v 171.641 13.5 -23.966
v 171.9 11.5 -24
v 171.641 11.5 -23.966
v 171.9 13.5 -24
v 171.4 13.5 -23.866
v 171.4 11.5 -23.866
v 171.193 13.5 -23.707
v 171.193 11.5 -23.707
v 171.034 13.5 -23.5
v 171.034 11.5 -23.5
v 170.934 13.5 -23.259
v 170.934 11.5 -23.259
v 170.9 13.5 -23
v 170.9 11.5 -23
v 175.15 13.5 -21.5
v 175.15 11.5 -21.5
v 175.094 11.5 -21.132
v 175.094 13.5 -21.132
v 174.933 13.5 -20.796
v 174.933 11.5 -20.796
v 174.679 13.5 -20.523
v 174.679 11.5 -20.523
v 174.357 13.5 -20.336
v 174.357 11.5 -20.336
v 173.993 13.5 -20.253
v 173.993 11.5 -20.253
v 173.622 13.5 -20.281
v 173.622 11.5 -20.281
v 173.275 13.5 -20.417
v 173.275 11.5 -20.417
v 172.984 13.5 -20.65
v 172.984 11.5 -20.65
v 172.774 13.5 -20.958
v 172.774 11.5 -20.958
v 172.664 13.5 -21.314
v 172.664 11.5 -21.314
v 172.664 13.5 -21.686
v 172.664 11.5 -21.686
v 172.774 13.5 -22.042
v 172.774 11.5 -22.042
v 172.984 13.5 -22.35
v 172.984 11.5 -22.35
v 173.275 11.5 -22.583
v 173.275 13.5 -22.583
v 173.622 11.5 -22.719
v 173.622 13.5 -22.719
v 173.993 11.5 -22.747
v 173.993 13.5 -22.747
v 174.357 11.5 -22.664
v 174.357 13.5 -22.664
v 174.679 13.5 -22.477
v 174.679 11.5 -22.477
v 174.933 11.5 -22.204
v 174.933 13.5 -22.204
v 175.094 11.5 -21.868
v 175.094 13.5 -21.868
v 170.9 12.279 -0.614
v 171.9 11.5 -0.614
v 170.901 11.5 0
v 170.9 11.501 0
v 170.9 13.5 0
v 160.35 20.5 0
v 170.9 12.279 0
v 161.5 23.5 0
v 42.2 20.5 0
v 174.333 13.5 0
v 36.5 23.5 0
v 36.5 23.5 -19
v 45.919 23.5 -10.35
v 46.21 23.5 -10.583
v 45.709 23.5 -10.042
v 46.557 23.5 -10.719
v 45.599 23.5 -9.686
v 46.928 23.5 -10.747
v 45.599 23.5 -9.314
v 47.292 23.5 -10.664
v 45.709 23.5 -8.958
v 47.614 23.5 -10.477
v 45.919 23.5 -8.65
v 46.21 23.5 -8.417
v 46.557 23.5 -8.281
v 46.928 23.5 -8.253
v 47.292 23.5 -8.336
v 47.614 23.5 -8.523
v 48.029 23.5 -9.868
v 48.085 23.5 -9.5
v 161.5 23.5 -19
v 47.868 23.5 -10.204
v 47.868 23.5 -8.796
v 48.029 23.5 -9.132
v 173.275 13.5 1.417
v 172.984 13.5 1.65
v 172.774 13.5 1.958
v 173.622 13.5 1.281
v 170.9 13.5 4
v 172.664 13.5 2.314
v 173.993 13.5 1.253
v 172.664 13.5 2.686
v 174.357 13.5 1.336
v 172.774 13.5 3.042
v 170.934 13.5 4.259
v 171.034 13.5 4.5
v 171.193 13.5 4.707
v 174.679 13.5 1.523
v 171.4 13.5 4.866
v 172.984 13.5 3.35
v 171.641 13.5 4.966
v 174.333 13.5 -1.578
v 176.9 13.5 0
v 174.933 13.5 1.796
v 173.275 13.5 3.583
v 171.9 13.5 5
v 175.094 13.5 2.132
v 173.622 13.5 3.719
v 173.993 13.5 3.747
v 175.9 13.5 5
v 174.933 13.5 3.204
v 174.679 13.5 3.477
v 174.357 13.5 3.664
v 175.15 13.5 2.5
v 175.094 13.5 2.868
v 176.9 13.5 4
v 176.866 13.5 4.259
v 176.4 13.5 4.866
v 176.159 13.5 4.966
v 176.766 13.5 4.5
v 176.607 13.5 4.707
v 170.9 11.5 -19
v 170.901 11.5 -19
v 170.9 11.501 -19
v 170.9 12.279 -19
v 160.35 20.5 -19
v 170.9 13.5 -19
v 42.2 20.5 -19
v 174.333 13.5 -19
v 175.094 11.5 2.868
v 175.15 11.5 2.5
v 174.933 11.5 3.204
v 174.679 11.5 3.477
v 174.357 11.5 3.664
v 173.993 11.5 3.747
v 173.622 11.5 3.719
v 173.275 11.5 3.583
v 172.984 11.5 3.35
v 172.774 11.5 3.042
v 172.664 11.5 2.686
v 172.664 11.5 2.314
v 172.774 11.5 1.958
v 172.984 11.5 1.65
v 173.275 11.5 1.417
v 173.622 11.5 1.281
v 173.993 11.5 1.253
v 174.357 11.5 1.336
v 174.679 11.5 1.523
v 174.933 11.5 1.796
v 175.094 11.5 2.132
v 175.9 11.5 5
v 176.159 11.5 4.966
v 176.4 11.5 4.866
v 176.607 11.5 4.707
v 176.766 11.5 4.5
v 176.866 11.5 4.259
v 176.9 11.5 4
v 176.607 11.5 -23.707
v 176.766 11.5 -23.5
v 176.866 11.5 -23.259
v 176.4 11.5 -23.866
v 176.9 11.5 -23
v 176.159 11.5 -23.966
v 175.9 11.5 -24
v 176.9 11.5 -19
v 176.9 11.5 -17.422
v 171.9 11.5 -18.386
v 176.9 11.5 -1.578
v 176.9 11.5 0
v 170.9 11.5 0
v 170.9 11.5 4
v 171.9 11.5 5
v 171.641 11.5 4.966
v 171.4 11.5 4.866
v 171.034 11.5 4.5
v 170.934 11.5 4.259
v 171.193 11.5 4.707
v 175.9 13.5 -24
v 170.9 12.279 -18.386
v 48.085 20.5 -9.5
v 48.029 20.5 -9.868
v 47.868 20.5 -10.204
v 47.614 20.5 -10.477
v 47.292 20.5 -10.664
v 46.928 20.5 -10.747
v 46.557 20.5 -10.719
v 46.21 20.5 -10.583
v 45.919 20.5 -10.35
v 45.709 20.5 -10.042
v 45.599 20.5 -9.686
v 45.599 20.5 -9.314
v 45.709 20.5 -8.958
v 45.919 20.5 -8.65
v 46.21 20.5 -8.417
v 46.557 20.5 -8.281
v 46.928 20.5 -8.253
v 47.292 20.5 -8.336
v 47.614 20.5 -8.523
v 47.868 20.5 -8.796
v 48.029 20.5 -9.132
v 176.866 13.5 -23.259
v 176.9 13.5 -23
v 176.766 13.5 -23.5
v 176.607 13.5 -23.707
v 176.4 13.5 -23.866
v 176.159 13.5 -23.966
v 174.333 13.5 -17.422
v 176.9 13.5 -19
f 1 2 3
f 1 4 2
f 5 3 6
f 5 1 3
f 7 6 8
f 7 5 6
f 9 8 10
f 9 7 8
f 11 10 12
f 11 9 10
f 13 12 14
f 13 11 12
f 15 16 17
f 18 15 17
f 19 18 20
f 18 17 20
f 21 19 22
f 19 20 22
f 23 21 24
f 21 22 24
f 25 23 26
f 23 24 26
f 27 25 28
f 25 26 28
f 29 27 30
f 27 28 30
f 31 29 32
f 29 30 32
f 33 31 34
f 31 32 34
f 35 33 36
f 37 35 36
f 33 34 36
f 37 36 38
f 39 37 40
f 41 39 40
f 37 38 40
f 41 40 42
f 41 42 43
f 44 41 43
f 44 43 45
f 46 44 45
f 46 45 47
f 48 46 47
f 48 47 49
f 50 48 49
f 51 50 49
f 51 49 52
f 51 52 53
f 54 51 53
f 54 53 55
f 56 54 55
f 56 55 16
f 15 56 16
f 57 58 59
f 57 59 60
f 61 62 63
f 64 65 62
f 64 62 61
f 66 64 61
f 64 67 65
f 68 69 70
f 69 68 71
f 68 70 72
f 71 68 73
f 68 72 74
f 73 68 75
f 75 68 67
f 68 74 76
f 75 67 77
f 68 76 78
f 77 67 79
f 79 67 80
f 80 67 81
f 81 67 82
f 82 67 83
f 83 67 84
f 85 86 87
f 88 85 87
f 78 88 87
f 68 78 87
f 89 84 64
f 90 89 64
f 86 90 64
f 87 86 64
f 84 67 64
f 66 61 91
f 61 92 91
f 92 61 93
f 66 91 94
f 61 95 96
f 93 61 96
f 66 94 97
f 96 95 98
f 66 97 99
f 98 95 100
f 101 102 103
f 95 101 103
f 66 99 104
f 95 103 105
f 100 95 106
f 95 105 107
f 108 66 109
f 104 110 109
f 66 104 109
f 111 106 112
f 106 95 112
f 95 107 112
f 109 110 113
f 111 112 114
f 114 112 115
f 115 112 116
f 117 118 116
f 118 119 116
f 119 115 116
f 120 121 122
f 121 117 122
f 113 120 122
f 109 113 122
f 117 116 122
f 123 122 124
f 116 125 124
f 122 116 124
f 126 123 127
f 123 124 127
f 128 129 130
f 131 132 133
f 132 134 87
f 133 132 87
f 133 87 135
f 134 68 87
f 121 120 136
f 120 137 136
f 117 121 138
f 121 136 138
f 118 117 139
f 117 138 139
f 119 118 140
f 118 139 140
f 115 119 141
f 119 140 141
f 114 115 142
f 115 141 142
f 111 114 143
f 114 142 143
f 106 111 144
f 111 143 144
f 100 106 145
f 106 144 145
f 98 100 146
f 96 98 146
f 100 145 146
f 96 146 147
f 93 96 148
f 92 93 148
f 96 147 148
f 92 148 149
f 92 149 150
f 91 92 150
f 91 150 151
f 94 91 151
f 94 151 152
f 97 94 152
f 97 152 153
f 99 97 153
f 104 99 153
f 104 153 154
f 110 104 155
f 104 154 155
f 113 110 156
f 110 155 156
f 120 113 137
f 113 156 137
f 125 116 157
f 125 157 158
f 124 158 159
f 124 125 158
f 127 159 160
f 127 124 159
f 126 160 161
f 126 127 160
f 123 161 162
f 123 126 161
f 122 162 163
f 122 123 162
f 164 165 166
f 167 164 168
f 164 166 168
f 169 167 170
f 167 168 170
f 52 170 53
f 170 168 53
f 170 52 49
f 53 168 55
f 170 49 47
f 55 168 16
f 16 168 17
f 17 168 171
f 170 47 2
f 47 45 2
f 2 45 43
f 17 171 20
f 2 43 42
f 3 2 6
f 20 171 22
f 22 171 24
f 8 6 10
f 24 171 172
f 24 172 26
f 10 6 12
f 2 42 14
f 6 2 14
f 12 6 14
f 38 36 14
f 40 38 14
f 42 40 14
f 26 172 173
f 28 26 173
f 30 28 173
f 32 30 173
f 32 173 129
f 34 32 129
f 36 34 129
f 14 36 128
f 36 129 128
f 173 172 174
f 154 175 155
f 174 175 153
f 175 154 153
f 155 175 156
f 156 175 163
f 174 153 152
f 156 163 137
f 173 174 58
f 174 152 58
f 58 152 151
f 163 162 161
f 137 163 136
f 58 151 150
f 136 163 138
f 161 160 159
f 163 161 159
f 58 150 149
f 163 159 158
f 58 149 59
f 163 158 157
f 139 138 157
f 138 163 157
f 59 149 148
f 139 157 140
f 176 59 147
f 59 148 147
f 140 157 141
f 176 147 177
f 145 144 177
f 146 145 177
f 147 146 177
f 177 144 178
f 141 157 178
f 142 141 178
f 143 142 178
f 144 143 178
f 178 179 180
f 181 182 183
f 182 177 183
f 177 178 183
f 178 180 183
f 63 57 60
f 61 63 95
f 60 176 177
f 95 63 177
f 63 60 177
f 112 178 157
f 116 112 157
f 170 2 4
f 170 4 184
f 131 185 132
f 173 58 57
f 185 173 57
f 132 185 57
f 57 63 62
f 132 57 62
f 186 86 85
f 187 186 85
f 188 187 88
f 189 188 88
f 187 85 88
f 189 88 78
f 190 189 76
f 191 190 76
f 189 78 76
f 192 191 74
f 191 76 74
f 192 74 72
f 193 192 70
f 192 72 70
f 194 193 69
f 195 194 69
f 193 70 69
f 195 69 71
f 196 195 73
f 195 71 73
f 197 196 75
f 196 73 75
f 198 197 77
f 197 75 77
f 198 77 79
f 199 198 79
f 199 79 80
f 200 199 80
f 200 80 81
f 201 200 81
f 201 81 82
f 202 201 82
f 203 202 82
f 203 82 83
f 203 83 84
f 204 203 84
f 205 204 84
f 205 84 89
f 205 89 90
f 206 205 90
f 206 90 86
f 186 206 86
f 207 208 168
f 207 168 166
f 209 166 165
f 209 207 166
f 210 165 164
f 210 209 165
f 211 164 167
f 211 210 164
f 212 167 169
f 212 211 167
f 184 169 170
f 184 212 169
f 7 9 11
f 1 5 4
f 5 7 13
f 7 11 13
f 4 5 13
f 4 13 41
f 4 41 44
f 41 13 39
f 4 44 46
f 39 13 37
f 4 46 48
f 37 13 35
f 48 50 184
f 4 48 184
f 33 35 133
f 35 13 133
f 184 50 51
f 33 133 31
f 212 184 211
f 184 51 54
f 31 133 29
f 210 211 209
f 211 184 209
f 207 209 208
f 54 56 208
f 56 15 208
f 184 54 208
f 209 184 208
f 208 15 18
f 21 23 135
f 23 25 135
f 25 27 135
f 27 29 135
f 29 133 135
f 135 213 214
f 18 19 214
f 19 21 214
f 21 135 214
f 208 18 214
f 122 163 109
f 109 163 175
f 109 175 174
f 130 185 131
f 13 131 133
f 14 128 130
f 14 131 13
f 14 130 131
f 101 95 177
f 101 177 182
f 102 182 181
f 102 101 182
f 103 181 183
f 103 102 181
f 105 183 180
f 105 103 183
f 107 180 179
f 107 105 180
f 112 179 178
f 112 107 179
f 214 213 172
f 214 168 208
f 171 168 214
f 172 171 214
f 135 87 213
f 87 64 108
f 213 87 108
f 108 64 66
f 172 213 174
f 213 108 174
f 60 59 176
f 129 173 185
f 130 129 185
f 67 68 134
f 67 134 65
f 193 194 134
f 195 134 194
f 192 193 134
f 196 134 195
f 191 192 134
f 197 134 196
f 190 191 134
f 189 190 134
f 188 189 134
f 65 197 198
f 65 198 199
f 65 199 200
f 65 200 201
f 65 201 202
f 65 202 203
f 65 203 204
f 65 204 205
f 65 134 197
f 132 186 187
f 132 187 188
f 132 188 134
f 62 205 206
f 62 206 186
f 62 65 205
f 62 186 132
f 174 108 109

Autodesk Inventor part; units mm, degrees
ref_plane "YZ Plane" through (0, 0, 0) normal (1, 0, 0) x (0, 1, 0)
ref_plane "XZ Plane" through (0, 0, 0) normal (0, 1, 0) x (-1, 0, 0)
ref_plane "XY Plane" through (0, 0, 0) normal (0, 0, 1) x (1, 0, 0)
sketch "Эскиз1" plane through (0, 0, 0) normal (0, 0, 1) x (1, 0, 0)
  line L0 (176.9, 11.5) -> (160.5, 11.5) projected
  line L1 (19.5, 13.5) -> (19.5, 3.5) projected
  line L2 (19.5, 3.5) -> (127.2, 3.5) projected
  line L3 (127.2, 3.5) -> (127.2, -1.5) projected
  line L4 (127.2, -1.5) -> (2.5, -1.5) projected
  line L5 (2.5, -1.5) -> (2.5, 18.5) projected
  line L6 (2.5, 18.5) -> (36.5, 18.5) projected
  line L7 (36.5, 18.5) -> (36.5, 13.5) projected
  line L8 (36.5, 13.5) -> (19.5, 13.5) projected
  line L9 (131.9067, -6.5) -> (131.9067, 11.5) projected
  line L10 (131.9067, 11.5) -> (59.18, 11.5) projected
  line L11 (59.18, 11.5) -> (51.5, 15.5635) projected
  line L12 (36.5, 23.5) -> (-2.5, 23.5) projected
  line L13 (-2.5, 23.5) -> (-2.5, 12.5) projected
  line L14 (-2.5, 12.5) -> (0.5, 12.5) projected
  line L15 (0.5, 12.5) -> (0.5, 9.5) projected
  line L16 (0.5, 9.5) -> (-2.5, 9.5) projected
  line L17 (-2.5, 9.5) -> (-2.5, -3.5) projected
  line L18 (5.5, -6.5) -> (131.9067, -6.5) projected
  circle A0 centre (129.7, 9) radius 1.25 projected
  line L19 (36.5, 23.5) -> (161.5, 23.5)
  line L20 (161.5, 23.5) -> (176.9, 11.5)
  line L21 (176.9, 11.5) -> (171.9, 11.5)
  line L22 (171.9, 11.5) -> (160.35, 20.5)
  line L23 (36.5, 23.5) -> (36.5, 20.5)
  line L24 (36.5, 20.5) -> (160.35, 20.5)
  line L25 (42.17, 20.5) -> (36.5, 23.5) projected
  line L26 (51.5, 20.5) -> (51.5, 15.5635) projected
  line L27 (42.17, 20.5) -> (51.5, 20.5) projected
  line L28 (5.5, -6.5) -> (5.5, -3.5) projected
  line L29 (-2.5, -3.5) -> (5.5, -3.5) projected
  point P0 (0, 0)
  point P1 (42.17, 20.5)
  dimension "d0" = 125
  dimension "d1" = 5
  dimension "d2" = 3
extrude "Выдавливание1" add sketch "Эскиз1" against normal blind 19 contours L0 L22 L24 L25 L19 L20 | L25 L24 L23
sketch "Эскиз2" plane through (36.5, 23.5, 0) normal (0, 1, 0) x (1, 0, 0)
  line L0 (125, 0) -> (0, 0) projected
  line L1 (0, 19) -> (125, 19) projected
  line L2 (0, 0) -> (10.335, 0) construction
  line L3 (10.335, 0) -> (10.335, 19) construction
  line L4 (10.335, 19) -> (0, 19) construction
  line L5 (0, 19) -> (0, 0) construction
  circle A0 centre (10.335, 9.5) radius 1.25
  point P0 (-36.5, 0)
  dimension "d5" = 10.335
  dimension "d6" = 2.5
extrude "Выдавливание2" cut sketch "Эскиз2" against normal blind 3
sketch "Эскиз3" plane through (171.9, 11.5, 0) normal (0, -1, 0) x (1, 0, 0)
  line L0 (5, 0) -> (-10.4, 0) projected
  line L1 (5, 0) -> (-1, 0)
  line L2 (-1, 0) -> (-1, 5)
  line L3 (-1, 5) -> (5, 5)
  line L4 (5, 5) -> (5, 0)
  line L5 (-1, 2.5) -> (5, 2.5) construction
  line L6 (2, 5) -> (2, 0) construction
  circle A0 centre (2, 2.5) radius 1.25
  line L7 (5, 0) -> (5, -19) construction
  line L8 (5, 0) -> (5, -19) construction
  line L9 (5, 0) -> (5, -19) construction
  line L10 (5, -9.5) -> (-10.4, -9.5) construction
  line L11 (-10.4, 0) -> (-10.4, -19) construction
  line L12 (5, -19) -> (-1, -19)
  line L13 (-1, -19) -> (-1, -24)
  line L14 (-1, -24) -> (5, -24)
  line L15 (5, -24) -> (5, -19)
  line L16 (-1, -21.5) -> (5, -21.5) construction
  line L17 (2, -24) -> (2, -19) construction
  circle A1 centre (2, -21.5) radius 1.25
  point P0 (-171.9, 0)
  point P1 (-1, 0)
  dimension "d9" = 6
  dimension "d10" = 5
  dimension "d11" = 2.5
extrude "Выдавливание3" add sketch "Эскиз3" against normal blind 2
chamfer "Фаска1" distance 1.5775 angle 45 2 edges at (175.6167, 12.5, -19) (175.6167, 12.5, 0)
fillet "Сопряжение1" radius 1 4 edges at (170.9, 12.5, 5) (176.9, 12.5, 5) (176.9, 12.5, -24) (170.9, 12.5, -24)
chamfer "Фаска2" distance 5.7 distance2 3 1 edges at (36.5, 20.5, -9.5) measured on face at (122.9283, 20.5, -9.5)
chamfer "Фаска3" distance 0.614 angle 45 2 edges at (171.4, 11.8896, 0) (171.4, 11.8896, -19)
properties part number "handle"
